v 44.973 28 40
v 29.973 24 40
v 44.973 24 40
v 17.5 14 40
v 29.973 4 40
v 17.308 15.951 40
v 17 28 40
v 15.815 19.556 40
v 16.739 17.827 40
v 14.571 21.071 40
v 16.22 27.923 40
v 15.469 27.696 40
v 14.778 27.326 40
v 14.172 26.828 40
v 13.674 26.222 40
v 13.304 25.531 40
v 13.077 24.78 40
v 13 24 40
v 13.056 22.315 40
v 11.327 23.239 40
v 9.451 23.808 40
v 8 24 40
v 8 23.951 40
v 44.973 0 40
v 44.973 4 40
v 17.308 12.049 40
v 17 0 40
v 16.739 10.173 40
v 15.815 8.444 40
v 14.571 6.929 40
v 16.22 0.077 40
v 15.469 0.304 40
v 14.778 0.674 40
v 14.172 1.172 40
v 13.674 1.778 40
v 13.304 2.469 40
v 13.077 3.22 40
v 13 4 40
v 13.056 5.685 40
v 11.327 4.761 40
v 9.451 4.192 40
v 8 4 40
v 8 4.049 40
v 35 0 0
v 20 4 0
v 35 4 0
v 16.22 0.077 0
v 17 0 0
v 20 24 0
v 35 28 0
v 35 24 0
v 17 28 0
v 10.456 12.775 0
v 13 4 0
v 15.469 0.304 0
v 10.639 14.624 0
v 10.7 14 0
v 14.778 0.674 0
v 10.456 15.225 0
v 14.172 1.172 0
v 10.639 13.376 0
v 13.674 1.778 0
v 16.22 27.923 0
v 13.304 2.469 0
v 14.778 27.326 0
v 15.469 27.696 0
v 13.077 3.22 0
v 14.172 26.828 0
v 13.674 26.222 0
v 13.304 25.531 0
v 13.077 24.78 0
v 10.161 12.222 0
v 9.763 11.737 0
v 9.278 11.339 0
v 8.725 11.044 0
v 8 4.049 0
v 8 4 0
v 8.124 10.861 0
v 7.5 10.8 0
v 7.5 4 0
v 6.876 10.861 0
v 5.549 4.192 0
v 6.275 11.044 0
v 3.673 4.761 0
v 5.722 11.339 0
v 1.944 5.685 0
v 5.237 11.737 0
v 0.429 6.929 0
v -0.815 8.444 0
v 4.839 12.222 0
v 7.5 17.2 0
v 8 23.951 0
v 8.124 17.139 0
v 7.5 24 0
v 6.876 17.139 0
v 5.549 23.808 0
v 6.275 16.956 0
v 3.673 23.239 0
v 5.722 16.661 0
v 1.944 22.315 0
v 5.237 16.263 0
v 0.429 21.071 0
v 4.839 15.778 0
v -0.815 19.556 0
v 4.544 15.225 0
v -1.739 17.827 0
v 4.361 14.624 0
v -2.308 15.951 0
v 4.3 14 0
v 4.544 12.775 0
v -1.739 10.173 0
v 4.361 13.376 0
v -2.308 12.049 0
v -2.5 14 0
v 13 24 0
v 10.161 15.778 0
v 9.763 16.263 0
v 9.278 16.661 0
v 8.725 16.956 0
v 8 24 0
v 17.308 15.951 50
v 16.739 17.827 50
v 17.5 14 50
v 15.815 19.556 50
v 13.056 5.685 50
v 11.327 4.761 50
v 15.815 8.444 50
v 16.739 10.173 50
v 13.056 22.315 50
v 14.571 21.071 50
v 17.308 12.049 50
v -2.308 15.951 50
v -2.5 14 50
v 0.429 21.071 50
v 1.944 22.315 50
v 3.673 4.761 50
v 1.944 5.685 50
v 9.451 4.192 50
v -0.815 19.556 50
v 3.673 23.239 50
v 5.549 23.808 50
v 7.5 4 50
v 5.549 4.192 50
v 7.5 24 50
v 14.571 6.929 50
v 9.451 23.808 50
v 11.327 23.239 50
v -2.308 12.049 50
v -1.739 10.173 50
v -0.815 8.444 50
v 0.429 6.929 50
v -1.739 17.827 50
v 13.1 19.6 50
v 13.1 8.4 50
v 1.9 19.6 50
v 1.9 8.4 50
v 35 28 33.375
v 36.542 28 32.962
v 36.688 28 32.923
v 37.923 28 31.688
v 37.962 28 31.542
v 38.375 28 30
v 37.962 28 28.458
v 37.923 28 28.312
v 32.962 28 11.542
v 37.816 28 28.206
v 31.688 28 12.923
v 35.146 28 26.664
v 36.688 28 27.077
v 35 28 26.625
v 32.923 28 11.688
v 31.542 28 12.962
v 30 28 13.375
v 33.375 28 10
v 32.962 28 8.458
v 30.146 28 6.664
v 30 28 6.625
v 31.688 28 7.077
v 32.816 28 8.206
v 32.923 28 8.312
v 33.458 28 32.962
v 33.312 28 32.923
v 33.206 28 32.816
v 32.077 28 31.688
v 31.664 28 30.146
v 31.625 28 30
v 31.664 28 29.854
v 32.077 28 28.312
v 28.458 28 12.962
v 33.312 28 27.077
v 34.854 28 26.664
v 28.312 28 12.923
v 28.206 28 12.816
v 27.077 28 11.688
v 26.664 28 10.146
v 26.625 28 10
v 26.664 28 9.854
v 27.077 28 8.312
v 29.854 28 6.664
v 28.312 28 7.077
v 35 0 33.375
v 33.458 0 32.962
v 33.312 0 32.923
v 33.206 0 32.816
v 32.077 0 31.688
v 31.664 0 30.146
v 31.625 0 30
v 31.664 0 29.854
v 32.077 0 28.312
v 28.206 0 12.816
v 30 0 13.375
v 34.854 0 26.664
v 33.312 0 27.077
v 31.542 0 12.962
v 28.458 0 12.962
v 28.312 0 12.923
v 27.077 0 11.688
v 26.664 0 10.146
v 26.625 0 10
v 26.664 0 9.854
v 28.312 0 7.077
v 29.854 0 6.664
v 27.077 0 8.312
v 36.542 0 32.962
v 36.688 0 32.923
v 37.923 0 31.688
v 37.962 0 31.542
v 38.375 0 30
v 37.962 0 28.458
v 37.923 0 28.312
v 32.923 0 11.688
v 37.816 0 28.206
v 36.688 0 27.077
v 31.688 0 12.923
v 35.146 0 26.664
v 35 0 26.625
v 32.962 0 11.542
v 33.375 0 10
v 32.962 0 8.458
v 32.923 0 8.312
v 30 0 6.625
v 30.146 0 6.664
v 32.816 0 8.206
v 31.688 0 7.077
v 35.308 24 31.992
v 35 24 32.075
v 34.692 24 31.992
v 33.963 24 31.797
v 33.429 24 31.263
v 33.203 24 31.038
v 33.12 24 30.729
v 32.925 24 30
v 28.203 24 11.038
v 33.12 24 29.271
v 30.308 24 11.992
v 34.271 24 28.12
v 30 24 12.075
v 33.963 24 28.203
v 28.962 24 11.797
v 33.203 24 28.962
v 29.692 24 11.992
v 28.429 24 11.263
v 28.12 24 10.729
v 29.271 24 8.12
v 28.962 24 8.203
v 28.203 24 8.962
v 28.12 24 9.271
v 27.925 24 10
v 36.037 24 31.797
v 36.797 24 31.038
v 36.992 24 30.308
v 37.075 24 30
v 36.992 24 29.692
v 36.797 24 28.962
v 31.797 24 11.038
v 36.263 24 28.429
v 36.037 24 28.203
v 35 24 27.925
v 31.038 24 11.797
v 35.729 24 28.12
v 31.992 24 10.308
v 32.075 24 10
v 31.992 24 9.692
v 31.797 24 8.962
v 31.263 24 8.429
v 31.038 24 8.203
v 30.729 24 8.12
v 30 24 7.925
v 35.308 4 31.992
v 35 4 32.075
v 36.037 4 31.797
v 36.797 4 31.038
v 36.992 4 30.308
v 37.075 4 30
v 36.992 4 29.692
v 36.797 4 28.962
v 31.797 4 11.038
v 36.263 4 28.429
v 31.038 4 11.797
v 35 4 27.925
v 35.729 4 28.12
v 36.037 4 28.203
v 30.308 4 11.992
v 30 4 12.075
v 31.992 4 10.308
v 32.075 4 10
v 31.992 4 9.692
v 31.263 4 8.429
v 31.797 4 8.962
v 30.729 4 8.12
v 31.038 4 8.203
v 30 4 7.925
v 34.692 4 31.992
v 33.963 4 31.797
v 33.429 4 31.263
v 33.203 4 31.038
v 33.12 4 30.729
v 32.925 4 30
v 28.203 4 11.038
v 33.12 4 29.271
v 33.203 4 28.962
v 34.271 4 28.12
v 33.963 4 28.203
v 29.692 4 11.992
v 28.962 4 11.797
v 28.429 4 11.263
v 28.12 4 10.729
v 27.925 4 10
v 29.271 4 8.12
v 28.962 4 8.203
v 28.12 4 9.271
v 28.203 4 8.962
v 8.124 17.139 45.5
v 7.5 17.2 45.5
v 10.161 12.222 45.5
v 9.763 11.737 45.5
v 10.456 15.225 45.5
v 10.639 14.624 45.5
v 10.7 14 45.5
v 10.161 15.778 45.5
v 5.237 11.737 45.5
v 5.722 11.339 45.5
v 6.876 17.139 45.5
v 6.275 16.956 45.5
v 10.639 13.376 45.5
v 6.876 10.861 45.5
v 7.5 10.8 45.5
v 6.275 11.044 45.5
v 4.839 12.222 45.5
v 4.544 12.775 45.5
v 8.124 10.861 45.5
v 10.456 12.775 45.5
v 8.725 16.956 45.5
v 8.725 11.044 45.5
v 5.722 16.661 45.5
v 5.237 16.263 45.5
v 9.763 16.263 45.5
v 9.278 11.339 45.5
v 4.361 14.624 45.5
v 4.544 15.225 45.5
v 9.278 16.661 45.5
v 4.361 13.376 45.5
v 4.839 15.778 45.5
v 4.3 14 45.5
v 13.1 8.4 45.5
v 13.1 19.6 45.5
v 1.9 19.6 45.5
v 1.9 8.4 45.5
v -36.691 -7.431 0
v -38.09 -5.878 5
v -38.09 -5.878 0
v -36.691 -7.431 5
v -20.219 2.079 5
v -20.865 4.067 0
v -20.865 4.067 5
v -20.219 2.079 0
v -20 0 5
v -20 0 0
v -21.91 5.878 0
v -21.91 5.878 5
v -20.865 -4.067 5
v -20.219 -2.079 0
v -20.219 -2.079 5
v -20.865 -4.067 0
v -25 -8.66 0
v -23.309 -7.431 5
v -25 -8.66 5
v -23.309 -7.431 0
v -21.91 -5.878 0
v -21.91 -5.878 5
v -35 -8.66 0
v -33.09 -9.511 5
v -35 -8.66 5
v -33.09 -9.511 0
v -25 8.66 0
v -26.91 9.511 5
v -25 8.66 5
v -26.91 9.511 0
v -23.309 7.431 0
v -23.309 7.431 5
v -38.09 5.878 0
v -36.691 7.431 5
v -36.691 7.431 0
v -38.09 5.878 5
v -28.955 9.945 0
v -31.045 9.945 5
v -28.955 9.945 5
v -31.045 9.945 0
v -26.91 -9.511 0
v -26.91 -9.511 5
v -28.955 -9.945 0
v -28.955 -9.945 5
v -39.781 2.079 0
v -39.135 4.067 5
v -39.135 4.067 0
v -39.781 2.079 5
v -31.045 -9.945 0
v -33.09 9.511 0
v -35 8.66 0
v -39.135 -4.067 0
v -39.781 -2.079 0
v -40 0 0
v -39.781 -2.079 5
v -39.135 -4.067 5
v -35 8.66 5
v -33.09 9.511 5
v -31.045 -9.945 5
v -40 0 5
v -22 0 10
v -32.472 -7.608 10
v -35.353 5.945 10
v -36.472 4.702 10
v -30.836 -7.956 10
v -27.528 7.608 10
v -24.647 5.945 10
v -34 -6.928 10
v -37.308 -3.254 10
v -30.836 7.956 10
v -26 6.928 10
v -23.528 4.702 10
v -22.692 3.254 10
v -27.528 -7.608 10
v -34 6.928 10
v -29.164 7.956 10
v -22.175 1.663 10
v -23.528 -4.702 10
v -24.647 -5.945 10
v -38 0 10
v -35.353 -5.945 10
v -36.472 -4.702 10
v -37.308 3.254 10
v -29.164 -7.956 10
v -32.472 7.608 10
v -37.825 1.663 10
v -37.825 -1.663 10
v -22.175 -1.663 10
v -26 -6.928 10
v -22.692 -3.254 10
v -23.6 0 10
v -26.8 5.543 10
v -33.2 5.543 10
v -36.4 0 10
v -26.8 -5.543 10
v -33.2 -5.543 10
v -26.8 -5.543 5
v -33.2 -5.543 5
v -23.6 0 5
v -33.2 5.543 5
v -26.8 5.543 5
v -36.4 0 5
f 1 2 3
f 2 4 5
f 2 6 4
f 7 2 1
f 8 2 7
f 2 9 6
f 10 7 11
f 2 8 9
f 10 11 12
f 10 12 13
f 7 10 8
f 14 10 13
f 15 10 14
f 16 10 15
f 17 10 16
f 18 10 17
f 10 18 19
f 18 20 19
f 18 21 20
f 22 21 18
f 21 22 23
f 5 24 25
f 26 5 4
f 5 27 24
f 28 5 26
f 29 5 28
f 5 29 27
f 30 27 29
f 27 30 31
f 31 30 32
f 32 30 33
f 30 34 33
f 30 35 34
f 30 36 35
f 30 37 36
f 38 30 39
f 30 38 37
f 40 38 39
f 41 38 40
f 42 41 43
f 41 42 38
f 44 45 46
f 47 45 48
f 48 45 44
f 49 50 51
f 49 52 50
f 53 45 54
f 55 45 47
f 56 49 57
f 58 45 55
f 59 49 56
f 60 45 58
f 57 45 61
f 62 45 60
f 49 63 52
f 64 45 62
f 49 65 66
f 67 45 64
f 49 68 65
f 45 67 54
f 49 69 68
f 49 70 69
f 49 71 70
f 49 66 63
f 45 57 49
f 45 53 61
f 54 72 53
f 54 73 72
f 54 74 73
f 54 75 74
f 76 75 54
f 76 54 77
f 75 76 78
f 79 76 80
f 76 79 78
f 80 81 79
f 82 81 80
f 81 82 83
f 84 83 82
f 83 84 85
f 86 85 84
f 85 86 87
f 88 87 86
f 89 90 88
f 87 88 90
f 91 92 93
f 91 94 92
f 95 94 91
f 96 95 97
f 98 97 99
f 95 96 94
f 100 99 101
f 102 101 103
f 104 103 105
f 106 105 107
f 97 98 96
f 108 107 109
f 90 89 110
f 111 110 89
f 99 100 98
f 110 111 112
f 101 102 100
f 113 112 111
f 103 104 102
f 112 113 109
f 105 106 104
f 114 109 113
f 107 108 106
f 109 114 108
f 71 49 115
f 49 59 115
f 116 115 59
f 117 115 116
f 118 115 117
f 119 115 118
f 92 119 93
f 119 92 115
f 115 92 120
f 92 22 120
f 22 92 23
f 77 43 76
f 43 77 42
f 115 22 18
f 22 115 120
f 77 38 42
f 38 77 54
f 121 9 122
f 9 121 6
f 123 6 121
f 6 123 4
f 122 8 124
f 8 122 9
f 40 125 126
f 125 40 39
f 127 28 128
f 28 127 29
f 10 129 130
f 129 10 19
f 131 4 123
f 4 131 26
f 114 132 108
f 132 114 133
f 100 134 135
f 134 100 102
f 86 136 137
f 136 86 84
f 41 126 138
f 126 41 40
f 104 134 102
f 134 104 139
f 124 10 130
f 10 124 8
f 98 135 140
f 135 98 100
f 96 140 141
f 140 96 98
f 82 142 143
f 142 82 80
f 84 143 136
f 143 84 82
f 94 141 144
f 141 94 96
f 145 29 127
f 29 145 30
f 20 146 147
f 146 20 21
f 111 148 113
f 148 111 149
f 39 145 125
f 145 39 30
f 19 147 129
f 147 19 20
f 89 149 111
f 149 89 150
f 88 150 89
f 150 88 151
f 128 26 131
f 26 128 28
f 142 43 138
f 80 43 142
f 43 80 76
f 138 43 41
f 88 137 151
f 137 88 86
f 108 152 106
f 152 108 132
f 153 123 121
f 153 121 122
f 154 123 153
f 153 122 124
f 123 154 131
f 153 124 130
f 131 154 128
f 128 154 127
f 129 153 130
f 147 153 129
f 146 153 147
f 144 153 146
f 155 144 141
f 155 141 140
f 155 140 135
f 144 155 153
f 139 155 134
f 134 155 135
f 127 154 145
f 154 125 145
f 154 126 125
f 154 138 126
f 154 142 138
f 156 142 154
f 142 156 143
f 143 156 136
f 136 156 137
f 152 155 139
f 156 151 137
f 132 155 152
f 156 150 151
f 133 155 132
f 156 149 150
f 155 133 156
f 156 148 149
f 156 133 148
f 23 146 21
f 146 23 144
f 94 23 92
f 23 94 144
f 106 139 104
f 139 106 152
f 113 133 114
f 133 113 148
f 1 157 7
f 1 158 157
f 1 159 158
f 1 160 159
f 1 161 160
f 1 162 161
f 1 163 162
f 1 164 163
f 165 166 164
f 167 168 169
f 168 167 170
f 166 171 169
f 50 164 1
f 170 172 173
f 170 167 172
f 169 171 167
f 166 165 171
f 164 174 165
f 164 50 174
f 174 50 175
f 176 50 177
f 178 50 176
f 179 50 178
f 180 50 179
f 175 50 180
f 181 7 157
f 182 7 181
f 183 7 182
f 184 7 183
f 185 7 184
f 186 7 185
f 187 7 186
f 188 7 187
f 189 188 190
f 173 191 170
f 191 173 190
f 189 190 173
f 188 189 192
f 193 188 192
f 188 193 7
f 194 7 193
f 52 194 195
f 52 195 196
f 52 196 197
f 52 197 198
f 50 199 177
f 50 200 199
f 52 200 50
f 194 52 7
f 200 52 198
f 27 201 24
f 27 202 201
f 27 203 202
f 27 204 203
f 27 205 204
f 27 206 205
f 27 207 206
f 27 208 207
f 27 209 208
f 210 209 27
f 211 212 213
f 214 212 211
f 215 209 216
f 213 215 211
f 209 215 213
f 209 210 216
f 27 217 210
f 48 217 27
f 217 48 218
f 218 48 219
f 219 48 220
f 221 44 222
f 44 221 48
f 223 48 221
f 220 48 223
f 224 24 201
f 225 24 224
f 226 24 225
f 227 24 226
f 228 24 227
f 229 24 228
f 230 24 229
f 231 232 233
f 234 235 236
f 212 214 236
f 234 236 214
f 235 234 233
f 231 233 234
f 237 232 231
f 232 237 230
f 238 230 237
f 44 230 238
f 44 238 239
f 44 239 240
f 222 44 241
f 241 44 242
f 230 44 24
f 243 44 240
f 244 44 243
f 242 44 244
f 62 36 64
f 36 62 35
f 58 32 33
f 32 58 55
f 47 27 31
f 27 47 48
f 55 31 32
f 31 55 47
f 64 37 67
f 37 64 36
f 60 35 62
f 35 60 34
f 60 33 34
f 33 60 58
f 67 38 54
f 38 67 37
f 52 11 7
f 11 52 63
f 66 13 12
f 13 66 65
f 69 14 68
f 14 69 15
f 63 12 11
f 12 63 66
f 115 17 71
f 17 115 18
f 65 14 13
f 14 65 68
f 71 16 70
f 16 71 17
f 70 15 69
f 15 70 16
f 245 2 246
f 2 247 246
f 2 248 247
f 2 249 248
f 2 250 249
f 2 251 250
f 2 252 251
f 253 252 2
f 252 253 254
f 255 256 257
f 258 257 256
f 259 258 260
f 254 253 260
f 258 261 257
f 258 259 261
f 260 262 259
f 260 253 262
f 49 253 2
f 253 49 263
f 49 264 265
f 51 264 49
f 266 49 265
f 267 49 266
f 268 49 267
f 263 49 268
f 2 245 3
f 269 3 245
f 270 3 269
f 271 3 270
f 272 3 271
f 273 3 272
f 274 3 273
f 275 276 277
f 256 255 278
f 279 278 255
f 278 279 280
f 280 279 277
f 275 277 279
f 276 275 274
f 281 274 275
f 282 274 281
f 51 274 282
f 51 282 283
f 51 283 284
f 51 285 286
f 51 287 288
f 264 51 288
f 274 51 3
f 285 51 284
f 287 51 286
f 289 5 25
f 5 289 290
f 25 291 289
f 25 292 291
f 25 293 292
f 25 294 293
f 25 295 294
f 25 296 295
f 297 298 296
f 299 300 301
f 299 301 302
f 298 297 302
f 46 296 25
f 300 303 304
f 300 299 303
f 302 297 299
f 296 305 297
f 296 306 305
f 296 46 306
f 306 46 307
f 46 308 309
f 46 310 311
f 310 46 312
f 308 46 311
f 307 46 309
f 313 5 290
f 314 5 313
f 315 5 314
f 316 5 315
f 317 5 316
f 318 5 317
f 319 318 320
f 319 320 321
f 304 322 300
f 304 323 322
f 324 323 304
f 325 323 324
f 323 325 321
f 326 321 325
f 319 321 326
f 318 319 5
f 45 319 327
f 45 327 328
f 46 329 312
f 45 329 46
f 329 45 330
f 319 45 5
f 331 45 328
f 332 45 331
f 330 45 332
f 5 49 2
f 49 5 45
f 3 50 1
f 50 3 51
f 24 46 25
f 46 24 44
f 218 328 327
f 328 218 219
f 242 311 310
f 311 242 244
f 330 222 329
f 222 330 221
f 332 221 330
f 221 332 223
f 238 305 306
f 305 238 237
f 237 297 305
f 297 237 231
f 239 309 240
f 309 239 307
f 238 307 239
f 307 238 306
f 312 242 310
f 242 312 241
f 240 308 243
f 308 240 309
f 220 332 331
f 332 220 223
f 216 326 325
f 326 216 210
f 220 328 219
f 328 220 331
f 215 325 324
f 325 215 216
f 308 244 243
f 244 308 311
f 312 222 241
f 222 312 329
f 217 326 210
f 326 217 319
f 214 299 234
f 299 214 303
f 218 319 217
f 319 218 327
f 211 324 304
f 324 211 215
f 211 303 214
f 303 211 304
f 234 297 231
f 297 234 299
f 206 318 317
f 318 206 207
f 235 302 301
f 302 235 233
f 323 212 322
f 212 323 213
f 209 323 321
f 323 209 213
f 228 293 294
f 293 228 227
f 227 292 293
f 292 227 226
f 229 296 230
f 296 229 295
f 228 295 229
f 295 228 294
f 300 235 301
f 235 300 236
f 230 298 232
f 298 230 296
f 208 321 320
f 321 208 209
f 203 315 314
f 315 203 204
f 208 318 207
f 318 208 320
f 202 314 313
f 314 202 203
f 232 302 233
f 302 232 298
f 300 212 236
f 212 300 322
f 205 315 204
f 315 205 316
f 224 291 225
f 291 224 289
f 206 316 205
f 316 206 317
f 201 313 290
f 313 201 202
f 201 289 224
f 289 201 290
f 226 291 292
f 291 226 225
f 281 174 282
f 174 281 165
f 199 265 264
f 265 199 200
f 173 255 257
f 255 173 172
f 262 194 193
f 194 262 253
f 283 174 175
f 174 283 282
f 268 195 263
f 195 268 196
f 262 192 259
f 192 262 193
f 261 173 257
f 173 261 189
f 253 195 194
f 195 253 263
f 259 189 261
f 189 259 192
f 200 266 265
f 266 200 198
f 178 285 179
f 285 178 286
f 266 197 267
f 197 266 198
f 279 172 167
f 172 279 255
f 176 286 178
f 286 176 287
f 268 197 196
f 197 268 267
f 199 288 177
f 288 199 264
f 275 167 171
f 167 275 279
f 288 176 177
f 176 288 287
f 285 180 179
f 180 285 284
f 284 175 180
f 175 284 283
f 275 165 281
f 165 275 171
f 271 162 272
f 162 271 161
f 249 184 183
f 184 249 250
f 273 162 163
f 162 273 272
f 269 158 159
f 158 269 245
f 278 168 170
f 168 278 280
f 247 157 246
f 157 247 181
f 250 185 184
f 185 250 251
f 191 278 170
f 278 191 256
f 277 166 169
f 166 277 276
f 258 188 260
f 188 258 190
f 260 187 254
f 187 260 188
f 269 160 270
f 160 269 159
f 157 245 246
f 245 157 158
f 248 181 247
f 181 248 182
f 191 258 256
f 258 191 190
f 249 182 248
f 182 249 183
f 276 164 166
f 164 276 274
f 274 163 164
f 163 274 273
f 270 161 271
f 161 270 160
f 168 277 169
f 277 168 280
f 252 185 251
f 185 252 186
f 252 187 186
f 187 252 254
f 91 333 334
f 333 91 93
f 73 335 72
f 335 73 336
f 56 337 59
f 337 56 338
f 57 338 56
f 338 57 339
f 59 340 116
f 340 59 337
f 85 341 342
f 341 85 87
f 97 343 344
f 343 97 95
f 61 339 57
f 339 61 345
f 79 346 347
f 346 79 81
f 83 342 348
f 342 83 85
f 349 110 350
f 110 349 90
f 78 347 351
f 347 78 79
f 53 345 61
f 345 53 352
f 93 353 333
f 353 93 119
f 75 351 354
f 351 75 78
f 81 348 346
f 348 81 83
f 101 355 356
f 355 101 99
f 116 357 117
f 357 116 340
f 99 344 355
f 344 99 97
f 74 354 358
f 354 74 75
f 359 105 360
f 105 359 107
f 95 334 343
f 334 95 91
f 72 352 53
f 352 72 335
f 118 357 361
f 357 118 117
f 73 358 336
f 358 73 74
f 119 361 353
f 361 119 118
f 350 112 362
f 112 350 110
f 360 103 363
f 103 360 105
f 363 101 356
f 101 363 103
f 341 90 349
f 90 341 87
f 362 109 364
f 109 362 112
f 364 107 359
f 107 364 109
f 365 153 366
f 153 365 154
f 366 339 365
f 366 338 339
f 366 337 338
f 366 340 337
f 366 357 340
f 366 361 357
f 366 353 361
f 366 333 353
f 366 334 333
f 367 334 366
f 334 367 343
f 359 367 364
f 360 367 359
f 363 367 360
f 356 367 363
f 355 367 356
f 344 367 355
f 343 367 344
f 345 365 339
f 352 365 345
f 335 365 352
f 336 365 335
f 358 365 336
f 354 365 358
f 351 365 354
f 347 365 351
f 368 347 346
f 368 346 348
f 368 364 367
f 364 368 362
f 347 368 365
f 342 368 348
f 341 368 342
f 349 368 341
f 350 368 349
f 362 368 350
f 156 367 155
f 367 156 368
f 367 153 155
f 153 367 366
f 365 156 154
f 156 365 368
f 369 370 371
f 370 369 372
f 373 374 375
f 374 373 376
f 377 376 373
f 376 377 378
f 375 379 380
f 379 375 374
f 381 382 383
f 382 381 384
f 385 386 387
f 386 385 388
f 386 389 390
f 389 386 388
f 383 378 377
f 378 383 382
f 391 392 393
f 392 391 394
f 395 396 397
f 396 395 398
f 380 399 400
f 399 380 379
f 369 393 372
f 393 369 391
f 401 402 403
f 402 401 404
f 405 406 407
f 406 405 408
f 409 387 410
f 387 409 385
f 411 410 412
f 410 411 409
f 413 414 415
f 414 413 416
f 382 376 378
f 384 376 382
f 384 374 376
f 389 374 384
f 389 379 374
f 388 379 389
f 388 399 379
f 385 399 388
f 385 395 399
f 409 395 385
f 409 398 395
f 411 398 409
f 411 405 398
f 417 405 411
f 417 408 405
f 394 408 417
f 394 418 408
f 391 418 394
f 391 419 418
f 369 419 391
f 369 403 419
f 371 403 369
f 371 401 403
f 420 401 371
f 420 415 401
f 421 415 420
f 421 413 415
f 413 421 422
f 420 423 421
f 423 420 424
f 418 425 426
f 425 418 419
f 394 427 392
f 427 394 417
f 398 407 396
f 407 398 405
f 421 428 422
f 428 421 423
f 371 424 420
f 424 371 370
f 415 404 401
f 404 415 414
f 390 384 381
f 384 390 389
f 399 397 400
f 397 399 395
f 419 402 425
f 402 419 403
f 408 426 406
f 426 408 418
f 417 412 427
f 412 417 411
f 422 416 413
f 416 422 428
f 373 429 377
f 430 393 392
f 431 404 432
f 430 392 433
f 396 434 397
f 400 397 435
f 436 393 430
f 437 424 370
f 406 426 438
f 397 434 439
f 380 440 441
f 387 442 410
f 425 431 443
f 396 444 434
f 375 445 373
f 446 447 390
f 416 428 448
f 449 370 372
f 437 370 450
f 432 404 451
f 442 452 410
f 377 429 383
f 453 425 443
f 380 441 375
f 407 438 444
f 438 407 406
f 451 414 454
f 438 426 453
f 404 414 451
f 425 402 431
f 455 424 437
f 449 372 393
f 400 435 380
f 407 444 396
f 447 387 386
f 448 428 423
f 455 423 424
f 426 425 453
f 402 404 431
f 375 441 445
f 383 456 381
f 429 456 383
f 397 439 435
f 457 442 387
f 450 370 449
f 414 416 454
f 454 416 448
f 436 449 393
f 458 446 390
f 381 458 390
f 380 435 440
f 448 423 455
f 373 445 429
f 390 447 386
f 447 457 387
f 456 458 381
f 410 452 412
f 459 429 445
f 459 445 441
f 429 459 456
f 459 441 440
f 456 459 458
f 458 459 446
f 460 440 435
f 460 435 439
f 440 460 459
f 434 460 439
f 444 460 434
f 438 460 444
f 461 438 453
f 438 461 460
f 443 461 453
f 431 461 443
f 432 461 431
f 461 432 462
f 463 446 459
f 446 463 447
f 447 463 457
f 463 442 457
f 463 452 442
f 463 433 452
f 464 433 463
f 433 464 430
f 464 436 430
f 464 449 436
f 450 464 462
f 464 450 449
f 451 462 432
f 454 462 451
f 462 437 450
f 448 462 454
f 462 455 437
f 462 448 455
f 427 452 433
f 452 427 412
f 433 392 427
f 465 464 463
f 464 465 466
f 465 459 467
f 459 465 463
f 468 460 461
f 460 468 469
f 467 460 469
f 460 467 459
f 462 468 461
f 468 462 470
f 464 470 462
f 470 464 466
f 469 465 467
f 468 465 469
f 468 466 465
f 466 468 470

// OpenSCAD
//
// This thing creates an adjustable riser to hold a glass
// shelf in a replica of a Chesapeake skiff. It is provided
// for demonstration purposes only since it is very specific
// to a one-of-a-kind work (the boat).
//
// Created by: Charles Bell
//
// Enjoy!
// 
difference() {
  union() {
    translate([8,4,0]) cube([20,20,40]);
    translate([7.5,14,0]) cylinder(50,10,10,$fn=32);
    translate([17,0,0]) cube([30,28,40]);
    translate([17,4,0]) cylinder(40,4,4,$fn=32);
    translate([17,24,0]) cylinder(40,4,4,$fn=32);
  }
  translate([20,4,-0]) rotate([0,14,0]) cube([30,20,50]);
  translate([35,-1,-0]) rotate([0,14,0]) cube([30,40,50]);
  translate([30,5,10]) rotate([90,0,0]) cylinder(6,1.75,3.7);
  translate([35,5,30]) rotate([90,0,0]) cylinder(6,1.75,3.7);
  translate([30,29,10]) rotate([90,0,0]) cylinder(6,3.7,1.75);
  translate([35,29,30]) rotate([90,0,0]) cylinder(6,3.7,1.75);
  translate([7.5,14,0]) cylinder(100,3.2,3.2,center=true,$fn=32);
  translate([7.5,14,48]) cube([11.2,11.2,5],center=true);
}

translate([-30,0,0]) difference() {
  union() {
    cylinder(5,10,10);
    translate([0,0,5]) cylinder(5,10,8);
  }
  translate([0,0,5]) cylinder(6,6.4,6.4,$fn=6);
}
